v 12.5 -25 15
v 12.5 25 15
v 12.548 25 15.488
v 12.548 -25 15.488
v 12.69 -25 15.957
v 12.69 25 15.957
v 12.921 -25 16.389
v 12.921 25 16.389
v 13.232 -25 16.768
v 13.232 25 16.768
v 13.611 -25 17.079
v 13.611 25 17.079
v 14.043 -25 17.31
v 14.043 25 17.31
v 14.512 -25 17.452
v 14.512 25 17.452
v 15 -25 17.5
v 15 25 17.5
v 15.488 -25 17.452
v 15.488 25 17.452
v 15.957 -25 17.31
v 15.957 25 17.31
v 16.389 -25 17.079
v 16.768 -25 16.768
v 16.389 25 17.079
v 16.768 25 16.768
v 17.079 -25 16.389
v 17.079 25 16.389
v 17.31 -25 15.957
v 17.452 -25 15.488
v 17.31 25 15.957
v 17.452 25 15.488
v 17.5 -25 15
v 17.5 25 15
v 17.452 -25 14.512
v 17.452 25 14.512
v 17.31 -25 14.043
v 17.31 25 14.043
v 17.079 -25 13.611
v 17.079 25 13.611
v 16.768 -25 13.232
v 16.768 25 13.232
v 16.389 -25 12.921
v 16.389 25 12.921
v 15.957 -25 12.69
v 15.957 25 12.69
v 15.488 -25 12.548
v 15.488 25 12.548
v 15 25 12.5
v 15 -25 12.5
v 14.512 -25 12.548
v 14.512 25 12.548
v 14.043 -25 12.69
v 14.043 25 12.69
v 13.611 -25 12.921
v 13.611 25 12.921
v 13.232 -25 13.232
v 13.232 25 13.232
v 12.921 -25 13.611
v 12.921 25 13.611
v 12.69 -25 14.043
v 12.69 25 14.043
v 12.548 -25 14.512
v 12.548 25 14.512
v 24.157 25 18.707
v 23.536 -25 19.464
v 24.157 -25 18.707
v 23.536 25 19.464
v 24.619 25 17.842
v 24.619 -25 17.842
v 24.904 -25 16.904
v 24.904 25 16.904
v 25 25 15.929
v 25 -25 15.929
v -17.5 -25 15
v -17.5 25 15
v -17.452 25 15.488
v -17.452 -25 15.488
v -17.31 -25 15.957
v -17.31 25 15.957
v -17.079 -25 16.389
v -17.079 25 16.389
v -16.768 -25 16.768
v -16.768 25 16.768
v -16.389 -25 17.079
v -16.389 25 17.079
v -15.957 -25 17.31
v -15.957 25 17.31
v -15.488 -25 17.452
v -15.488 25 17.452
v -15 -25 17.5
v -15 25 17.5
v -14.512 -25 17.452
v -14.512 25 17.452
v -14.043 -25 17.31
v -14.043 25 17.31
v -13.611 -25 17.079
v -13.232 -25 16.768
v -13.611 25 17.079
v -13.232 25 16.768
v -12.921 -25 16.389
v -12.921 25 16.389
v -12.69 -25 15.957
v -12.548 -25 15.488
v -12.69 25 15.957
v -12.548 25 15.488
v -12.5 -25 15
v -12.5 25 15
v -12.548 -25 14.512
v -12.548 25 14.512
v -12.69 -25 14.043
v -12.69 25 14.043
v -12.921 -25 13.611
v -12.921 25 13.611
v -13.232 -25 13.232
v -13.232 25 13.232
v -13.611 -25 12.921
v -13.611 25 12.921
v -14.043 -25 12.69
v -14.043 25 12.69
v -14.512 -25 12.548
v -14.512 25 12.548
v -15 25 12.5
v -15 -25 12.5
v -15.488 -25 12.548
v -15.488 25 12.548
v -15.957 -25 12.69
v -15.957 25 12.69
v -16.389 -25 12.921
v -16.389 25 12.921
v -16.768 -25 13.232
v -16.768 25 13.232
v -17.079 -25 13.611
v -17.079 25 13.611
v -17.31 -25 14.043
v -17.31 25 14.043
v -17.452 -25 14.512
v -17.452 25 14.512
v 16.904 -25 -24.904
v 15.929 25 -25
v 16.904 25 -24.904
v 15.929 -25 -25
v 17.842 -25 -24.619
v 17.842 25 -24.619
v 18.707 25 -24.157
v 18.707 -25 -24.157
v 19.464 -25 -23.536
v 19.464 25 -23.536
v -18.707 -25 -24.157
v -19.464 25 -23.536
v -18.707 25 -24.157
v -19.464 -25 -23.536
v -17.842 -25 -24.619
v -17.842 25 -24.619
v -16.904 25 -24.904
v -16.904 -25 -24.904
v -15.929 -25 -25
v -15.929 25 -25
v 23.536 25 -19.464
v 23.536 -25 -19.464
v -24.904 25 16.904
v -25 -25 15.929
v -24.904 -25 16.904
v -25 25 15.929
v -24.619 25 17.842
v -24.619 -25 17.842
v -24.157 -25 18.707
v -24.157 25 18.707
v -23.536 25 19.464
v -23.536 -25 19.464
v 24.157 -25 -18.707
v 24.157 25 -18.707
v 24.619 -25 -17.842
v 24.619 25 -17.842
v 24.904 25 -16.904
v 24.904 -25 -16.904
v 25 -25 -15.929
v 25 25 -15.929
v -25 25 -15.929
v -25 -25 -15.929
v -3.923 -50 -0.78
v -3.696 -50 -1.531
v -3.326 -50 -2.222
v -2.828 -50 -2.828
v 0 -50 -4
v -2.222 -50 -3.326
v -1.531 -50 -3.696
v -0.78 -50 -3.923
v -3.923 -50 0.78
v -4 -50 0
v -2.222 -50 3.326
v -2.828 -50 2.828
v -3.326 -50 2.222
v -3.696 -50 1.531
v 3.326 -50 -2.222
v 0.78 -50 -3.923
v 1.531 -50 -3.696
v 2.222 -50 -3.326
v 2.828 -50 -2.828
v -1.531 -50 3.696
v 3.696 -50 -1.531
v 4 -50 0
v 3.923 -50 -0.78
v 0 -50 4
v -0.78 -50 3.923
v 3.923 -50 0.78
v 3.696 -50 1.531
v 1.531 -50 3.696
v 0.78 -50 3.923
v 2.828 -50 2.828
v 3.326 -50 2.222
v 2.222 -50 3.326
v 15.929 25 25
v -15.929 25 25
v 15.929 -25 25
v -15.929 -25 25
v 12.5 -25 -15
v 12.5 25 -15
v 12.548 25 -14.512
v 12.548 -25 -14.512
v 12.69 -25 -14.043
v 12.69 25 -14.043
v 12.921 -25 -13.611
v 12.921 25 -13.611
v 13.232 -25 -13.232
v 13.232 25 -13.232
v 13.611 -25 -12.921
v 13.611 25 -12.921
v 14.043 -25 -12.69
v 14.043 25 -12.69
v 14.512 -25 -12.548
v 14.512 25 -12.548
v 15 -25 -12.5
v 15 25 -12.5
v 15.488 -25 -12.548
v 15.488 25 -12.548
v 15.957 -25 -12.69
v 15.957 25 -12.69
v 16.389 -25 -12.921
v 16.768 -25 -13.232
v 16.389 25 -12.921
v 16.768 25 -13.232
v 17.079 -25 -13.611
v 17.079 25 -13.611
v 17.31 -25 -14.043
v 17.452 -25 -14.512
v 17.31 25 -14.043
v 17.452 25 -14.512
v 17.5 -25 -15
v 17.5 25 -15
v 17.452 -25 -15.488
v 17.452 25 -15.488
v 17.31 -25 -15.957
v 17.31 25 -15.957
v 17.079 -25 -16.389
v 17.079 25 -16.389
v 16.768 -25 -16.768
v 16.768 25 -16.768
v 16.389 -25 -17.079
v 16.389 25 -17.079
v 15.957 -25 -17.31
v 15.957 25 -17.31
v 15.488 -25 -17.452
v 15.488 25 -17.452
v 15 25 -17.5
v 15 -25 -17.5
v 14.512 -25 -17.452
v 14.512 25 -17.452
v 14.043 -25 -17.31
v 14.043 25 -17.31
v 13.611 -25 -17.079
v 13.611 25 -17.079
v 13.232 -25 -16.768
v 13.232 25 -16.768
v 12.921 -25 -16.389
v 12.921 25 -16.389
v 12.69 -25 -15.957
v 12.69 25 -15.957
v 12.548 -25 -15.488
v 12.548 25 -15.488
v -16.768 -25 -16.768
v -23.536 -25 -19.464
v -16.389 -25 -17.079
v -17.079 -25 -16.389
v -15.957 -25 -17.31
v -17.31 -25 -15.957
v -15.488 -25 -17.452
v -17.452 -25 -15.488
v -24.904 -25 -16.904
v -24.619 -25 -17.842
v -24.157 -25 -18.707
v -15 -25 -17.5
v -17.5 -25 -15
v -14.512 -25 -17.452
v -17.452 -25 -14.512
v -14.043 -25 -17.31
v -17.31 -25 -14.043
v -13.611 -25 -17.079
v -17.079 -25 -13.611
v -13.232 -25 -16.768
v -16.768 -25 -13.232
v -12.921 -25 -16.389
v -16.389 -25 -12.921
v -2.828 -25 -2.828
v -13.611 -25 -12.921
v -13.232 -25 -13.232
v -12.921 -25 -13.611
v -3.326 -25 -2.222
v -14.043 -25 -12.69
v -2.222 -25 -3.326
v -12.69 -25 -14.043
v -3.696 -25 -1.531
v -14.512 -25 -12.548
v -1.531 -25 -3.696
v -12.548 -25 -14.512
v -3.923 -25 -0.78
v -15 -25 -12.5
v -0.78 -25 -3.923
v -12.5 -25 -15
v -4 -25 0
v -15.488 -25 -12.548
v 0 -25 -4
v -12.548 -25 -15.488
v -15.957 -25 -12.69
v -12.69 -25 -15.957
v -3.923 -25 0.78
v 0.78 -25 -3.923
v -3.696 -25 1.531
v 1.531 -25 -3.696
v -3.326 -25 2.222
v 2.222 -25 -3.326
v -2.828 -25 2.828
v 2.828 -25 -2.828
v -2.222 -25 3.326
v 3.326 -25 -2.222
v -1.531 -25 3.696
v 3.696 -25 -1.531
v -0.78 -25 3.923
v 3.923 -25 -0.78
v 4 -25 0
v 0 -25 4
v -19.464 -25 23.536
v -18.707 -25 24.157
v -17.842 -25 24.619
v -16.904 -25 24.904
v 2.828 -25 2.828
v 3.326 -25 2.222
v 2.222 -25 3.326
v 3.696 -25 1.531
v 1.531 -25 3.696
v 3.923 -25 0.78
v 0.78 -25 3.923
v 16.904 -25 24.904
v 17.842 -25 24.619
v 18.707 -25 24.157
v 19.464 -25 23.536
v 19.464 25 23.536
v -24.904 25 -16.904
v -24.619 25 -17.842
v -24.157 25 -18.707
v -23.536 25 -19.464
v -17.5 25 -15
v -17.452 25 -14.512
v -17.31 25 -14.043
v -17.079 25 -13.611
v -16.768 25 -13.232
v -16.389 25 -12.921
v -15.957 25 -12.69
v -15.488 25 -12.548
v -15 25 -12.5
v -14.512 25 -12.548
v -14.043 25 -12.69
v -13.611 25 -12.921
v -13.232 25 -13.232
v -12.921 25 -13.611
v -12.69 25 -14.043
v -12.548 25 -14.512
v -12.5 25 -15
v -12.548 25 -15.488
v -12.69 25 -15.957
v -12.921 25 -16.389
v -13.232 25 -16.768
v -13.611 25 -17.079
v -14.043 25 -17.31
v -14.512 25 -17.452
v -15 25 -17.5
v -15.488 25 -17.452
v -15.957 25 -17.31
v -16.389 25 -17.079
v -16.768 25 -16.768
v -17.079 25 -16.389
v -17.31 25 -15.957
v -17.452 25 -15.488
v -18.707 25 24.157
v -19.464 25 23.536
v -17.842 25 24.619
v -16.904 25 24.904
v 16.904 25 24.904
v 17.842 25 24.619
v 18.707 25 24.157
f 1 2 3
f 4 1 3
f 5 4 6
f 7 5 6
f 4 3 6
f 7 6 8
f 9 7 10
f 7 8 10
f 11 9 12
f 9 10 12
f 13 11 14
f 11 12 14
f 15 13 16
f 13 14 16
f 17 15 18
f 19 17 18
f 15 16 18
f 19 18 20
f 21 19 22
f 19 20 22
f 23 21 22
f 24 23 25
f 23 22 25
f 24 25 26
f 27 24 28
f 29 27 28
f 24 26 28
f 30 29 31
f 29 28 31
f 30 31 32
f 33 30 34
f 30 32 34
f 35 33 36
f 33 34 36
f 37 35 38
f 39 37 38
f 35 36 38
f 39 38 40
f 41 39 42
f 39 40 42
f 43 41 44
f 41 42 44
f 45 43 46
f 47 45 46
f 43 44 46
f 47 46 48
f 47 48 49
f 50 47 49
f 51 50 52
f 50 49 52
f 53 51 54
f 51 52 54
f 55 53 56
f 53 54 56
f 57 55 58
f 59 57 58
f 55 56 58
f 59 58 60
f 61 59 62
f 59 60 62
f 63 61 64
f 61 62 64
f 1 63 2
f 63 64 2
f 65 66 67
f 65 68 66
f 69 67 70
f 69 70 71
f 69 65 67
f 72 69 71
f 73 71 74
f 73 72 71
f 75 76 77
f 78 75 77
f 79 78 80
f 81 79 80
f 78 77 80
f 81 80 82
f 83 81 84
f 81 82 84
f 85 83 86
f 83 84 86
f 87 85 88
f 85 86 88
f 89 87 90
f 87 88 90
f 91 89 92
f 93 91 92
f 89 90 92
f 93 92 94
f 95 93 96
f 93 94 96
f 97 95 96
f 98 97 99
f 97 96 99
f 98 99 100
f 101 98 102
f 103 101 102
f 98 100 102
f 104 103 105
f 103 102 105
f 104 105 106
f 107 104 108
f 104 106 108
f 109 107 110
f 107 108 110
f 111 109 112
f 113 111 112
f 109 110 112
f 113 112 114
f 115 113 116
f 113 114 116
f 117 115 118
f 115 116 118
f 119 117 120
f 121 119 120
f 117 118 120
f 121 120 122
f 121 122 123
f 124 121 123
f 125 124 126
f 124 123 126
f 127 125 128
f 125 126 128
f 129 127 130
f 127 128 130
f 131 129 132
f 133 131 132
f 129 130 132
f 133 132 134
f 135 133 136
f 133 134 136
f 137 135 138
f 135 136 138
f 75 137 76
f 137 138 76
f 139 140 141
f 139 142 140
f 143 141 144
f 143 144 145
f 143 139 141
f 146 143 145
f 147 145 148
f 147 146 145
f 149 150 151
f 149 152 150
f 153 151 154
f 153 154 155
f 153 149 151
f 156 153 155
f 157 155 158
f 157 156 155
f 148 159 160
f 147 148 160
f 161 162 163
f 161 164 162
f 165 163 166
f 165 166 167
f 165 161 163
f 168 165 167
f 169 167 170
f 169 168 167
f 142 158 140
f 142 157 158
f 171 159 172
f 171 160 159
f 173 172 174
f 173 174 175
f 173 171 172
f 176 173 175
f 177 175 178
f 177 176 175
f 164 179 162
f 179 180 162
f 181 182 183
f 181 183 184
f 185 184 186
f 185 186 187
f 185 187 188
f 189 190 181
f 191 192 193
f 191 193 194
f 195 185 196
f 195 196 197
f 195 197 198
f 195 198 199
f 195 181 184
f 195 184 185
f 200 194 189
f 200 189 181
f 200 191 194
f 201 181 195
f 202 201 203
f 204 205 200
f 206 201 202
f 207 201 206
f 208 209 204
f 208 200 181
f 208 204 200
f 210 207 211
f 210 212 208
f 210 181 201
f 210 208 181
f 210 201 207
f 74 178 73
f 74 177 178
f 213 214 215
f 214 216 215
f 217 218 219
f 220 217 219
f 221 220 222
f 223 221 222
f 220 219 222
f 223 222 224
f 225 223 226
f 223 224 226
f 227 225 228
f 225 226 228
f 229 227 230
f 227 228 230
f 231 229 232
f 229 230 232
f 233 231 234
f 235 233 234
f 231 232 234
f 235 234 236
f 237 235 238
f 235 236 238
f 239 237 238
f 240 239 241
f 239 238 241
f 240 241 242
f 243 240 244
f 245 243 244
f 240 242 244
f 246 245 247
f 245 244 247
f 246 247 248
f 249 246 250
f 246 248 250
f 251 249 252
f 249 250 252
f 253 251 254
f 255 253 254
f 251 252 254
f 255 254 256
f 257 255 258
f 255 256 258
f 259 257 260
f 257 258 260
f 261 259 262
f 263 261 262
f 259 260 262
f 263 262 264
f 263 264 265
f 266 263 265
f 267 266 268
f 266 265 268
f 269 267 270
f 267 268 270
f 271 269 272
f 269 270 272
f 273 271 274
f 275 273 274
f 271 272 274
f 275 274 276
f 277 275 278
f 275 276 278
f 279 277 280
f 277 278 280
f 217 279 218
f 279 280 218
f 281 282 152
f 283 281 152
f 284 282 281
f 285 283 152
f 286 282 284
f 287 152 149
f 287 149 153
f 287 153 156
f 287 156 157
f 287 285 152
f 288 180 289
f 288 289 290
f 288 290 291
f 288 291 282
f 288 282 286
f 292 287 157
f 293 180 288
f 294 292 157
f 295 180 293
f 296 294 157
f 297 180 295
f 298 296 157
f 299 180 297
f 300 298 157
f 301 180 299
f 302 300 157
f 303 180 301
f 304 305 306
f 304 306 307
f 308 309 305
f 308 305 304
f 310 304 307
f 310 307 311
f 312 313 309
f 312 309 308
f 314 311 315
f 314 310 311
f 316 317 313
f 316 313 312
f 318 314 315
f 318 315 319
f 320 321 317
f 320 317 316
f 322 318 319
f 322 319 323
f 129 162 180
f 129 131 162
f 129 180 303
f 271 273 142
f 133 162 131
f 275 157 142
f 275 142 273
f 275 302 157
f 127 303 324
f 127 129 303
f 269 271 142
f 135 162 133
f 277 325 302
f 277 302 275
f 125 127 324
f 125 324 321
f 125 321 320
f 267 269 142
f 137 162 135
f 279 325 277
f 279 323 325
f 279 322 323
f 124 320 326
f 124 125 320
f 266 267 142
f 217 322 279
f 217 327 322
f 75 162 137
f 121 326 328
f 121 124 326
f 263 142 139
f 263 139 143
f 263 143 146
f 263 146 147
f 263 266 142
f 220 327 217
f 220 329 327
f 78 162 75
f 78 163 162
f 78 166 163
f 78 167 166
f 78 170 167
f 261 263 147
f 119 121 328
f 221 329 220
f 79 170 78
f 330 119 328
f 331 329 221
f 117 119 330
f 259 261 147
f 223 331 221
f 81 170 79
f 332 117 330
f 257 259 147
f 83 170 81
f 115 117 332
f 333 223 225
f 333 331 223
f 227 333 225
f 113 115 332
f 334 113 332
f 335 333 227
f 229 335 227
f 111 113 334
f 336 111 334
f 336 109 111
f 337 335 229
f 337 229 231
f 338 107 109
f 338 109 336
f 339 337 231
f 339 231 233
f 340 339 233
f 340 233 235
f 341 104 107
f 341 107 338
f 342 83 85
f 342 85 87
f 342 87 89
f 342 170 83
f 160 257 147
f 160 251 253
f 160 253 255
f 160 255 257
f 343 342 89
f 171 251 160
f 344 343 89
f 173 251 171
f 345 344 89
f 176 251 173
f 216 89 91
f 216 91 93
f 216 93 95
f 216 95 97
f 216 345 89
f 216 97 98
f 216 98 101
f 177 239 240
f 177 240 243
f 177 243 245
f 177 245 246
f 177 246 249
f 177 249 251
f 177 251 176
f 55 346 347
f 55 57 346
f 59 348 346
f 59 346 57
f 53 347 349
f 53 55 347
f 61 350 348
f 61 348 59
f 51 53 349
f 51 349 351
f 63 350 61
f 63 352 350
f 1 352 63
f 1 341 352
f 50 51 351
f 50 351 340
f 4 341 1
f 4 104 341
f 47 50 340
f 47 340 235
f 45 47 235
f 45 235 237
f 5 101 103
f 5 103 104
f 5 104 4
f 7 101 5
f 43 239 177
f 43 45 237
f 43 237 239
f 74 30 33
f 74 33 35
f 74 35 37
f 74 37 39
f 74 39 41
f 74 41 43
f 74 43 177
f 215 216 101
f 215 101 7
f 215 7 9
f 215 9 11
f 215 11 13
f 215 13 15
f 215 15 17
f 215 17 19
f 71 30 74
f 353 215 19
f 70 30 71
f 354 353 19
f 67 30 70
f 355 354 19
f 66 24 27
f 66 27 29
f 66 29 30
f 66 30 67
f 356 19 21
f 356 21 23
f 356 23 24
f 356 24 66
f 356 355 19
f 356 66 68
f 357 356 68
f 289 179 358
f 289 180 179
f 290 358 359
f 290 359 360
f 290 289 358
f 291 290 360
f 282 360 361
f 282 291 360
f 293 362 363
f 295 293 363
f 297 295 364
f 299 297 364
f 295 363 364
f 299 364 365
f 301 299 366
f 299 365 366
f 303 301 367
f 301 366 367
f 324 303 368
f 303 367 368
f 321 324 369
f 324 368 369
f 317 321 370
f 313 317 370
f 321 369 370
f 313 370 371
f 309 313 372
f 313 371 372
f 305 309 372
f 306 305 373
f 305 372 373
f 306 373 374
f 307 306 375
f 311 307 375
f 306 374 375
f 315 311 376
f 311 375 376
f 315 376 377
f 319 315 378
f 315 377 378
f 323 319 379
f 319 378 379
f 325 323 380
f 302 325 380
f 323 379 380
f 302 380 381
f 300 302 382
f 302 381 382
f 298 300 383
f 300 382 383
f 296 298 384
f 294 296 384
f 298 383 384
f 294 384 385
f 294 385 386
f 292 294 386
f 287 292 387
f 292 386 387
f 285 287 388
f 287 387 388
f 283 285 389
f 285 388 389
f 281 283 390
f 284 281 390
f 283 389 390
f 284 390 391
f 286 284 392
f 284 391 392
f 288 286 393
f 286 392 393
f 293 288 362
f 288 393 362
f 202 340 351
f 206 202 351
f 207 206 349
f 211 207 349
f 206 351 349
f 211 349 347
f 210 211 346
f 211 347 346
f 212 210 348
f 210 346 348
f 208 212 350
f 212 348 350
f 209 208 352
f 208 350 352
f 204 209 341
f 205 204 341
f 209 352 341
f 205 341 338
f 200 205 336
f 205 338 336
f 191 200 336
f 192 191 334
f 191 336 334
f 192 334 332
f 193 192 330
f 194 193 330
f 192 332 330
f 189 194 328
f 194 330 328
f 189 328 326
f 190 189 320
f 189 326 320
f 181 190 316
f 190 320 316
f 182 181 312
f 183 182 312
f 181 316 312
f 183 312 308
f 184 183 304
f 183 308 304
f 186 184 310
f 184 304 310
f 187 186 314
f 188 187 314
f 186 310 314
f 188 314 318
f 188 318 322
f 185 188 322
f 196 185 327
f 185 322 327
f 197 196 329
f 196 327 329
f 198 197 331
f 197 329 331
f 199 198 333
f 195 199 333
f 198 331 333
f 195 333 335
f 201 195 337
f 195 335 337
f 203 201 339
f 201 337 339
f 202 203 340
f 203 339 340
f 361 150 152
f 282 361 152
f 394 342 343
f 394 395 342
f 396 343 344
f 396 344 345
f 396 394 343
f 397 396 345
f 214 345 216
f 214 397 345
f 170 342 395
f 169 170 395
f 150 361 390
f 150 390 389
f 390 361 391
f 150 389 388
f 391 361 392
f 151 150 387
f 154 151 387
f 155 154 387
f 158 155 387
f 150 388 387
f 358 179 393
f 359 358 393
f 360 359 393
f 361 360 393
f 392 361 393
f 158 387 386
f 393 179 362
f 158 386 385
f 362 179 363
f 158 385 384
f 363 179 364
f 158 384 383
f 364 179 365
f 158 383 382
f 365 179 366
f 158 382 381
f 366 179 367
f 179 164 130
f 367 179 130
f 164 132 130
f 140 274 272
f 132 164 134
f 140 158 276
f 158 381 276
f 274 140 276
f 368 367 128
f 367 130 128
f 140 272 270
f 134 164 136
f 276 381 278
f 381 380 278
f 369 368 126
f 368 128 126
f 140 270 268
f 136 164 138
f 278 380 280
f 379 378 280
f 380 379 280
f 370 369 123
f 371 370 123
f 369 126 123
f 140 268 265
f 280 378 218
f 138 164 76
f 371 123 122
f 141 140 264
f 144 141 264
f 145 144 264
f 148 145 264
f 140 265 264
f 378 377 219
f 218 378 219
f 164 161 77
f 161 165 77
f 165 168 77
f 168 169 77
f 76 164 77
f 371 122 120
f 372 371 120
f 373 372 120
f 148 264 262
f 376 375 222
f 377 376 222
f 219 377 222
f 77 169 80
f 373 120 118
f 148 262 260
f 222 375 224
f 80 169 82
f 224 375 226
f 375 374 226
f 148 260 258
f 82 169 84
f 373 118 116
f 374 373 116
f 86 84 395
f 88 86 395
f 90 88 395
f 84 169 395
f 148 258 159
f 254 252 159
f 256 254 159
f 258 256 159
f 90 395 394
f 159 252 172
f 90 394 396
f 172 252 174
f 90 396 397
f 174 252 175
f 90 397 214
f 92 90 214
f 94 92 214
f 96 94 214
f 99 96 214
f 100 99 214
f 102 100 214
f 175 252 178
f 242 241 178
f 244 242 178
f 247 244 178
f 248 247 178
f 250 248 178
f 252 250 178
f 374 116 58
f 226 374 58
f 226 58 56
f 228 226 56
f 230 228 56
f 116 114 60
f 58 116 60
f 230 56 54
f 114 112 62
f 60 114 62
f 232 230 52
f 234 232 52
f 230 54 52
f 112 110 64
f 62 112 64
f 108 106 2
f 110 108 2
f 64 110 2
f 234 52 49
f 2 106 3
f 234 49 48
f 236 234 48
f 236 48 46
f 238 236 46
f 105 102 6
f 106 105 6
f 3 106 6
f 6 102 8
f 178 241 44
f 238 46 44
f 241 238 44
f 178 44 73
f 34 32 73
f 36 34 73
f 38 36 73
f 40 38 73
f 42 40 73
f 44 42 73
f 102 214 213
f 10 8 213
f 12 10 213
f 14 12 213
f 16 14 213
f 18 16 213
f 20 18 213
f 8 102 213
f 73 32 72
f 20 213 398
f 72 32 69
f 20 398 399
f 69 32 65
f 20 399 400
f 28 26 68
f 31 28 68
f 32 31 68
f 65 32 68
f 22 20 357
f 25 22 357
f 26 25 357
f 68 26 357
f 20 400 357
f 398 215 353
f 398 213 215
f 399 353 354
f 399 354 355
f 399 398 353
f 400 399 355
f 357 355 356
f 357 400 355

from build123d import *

# Parameters (mm, degrees)
F0_W          = 50
F0_H          = 50
F1_DEPTH      = 25
F1_DEPTH_BACK = 25
F2_R          = 4
F3_DEPTH      = 25
F4_SIZE       = 7
F5_R          = 5
F6_R          = 2.5
F7_DEPTH      = 50


with BuildPart() as f1:
    # F0 (on Front) → F1 (new body, two sides)
    with BuildSketch(Plane.XZ) as f1_sk:
        Rectangle(F0_W, F0_H)
    extrude(amount=F1_DEPTH)
    extrude(f1_sk.sketch, amount=-F1_DEPTH_BACK)

    # F2 (on face) → F3 (join)
    with BuildSketch(Plane.XZ.offset(25)):
        Circle(F2_R)
    extrude(amount=F3_DEPTH)

    # F4
    f4_edges = [f1.edges().sort_by_distance(p)[0] for p in [
        (-25, 0, 25),
        (25, 0, 25),
        (25, 0, -25),
        (-25, 0, -25),
    ]]
    chamfer(f4_edges, length=F4_SIZE)

    # F5
    f5_edges = [f1.edges().sort_by_distance(p)[0] for p in [
        (-18, 0, 25),
        (-25, 0, 18),
        (18, 0, 25),
        (25, 0, 18),
        (25, 0, -18),
        (18, 0, -25),
        (-18, 0, -25),
        (-25, 0, -18),
    ]]
    fillet(f5_edges, radius=F5_R)

    # F6 (on face) → F7 (cut)
    with BuildSketch(Plane(origin=(0, 25, 0), x_dir=(-1, 0, 0), z_dir=(0, 1, 0))):
        with Locations((-15, 15)):
            Circle(F6_R)
        with Locations((15, 15)):
            Circle(F6_R)
        with Locations((15, -15)):
            Circle(F6_R)
        with Locations((-15, -15)):
            Circle(F6_R)
    extrude(amount=-F7_DEPTH, mode=Mode.SUBTRACT)


solid = f1.part
